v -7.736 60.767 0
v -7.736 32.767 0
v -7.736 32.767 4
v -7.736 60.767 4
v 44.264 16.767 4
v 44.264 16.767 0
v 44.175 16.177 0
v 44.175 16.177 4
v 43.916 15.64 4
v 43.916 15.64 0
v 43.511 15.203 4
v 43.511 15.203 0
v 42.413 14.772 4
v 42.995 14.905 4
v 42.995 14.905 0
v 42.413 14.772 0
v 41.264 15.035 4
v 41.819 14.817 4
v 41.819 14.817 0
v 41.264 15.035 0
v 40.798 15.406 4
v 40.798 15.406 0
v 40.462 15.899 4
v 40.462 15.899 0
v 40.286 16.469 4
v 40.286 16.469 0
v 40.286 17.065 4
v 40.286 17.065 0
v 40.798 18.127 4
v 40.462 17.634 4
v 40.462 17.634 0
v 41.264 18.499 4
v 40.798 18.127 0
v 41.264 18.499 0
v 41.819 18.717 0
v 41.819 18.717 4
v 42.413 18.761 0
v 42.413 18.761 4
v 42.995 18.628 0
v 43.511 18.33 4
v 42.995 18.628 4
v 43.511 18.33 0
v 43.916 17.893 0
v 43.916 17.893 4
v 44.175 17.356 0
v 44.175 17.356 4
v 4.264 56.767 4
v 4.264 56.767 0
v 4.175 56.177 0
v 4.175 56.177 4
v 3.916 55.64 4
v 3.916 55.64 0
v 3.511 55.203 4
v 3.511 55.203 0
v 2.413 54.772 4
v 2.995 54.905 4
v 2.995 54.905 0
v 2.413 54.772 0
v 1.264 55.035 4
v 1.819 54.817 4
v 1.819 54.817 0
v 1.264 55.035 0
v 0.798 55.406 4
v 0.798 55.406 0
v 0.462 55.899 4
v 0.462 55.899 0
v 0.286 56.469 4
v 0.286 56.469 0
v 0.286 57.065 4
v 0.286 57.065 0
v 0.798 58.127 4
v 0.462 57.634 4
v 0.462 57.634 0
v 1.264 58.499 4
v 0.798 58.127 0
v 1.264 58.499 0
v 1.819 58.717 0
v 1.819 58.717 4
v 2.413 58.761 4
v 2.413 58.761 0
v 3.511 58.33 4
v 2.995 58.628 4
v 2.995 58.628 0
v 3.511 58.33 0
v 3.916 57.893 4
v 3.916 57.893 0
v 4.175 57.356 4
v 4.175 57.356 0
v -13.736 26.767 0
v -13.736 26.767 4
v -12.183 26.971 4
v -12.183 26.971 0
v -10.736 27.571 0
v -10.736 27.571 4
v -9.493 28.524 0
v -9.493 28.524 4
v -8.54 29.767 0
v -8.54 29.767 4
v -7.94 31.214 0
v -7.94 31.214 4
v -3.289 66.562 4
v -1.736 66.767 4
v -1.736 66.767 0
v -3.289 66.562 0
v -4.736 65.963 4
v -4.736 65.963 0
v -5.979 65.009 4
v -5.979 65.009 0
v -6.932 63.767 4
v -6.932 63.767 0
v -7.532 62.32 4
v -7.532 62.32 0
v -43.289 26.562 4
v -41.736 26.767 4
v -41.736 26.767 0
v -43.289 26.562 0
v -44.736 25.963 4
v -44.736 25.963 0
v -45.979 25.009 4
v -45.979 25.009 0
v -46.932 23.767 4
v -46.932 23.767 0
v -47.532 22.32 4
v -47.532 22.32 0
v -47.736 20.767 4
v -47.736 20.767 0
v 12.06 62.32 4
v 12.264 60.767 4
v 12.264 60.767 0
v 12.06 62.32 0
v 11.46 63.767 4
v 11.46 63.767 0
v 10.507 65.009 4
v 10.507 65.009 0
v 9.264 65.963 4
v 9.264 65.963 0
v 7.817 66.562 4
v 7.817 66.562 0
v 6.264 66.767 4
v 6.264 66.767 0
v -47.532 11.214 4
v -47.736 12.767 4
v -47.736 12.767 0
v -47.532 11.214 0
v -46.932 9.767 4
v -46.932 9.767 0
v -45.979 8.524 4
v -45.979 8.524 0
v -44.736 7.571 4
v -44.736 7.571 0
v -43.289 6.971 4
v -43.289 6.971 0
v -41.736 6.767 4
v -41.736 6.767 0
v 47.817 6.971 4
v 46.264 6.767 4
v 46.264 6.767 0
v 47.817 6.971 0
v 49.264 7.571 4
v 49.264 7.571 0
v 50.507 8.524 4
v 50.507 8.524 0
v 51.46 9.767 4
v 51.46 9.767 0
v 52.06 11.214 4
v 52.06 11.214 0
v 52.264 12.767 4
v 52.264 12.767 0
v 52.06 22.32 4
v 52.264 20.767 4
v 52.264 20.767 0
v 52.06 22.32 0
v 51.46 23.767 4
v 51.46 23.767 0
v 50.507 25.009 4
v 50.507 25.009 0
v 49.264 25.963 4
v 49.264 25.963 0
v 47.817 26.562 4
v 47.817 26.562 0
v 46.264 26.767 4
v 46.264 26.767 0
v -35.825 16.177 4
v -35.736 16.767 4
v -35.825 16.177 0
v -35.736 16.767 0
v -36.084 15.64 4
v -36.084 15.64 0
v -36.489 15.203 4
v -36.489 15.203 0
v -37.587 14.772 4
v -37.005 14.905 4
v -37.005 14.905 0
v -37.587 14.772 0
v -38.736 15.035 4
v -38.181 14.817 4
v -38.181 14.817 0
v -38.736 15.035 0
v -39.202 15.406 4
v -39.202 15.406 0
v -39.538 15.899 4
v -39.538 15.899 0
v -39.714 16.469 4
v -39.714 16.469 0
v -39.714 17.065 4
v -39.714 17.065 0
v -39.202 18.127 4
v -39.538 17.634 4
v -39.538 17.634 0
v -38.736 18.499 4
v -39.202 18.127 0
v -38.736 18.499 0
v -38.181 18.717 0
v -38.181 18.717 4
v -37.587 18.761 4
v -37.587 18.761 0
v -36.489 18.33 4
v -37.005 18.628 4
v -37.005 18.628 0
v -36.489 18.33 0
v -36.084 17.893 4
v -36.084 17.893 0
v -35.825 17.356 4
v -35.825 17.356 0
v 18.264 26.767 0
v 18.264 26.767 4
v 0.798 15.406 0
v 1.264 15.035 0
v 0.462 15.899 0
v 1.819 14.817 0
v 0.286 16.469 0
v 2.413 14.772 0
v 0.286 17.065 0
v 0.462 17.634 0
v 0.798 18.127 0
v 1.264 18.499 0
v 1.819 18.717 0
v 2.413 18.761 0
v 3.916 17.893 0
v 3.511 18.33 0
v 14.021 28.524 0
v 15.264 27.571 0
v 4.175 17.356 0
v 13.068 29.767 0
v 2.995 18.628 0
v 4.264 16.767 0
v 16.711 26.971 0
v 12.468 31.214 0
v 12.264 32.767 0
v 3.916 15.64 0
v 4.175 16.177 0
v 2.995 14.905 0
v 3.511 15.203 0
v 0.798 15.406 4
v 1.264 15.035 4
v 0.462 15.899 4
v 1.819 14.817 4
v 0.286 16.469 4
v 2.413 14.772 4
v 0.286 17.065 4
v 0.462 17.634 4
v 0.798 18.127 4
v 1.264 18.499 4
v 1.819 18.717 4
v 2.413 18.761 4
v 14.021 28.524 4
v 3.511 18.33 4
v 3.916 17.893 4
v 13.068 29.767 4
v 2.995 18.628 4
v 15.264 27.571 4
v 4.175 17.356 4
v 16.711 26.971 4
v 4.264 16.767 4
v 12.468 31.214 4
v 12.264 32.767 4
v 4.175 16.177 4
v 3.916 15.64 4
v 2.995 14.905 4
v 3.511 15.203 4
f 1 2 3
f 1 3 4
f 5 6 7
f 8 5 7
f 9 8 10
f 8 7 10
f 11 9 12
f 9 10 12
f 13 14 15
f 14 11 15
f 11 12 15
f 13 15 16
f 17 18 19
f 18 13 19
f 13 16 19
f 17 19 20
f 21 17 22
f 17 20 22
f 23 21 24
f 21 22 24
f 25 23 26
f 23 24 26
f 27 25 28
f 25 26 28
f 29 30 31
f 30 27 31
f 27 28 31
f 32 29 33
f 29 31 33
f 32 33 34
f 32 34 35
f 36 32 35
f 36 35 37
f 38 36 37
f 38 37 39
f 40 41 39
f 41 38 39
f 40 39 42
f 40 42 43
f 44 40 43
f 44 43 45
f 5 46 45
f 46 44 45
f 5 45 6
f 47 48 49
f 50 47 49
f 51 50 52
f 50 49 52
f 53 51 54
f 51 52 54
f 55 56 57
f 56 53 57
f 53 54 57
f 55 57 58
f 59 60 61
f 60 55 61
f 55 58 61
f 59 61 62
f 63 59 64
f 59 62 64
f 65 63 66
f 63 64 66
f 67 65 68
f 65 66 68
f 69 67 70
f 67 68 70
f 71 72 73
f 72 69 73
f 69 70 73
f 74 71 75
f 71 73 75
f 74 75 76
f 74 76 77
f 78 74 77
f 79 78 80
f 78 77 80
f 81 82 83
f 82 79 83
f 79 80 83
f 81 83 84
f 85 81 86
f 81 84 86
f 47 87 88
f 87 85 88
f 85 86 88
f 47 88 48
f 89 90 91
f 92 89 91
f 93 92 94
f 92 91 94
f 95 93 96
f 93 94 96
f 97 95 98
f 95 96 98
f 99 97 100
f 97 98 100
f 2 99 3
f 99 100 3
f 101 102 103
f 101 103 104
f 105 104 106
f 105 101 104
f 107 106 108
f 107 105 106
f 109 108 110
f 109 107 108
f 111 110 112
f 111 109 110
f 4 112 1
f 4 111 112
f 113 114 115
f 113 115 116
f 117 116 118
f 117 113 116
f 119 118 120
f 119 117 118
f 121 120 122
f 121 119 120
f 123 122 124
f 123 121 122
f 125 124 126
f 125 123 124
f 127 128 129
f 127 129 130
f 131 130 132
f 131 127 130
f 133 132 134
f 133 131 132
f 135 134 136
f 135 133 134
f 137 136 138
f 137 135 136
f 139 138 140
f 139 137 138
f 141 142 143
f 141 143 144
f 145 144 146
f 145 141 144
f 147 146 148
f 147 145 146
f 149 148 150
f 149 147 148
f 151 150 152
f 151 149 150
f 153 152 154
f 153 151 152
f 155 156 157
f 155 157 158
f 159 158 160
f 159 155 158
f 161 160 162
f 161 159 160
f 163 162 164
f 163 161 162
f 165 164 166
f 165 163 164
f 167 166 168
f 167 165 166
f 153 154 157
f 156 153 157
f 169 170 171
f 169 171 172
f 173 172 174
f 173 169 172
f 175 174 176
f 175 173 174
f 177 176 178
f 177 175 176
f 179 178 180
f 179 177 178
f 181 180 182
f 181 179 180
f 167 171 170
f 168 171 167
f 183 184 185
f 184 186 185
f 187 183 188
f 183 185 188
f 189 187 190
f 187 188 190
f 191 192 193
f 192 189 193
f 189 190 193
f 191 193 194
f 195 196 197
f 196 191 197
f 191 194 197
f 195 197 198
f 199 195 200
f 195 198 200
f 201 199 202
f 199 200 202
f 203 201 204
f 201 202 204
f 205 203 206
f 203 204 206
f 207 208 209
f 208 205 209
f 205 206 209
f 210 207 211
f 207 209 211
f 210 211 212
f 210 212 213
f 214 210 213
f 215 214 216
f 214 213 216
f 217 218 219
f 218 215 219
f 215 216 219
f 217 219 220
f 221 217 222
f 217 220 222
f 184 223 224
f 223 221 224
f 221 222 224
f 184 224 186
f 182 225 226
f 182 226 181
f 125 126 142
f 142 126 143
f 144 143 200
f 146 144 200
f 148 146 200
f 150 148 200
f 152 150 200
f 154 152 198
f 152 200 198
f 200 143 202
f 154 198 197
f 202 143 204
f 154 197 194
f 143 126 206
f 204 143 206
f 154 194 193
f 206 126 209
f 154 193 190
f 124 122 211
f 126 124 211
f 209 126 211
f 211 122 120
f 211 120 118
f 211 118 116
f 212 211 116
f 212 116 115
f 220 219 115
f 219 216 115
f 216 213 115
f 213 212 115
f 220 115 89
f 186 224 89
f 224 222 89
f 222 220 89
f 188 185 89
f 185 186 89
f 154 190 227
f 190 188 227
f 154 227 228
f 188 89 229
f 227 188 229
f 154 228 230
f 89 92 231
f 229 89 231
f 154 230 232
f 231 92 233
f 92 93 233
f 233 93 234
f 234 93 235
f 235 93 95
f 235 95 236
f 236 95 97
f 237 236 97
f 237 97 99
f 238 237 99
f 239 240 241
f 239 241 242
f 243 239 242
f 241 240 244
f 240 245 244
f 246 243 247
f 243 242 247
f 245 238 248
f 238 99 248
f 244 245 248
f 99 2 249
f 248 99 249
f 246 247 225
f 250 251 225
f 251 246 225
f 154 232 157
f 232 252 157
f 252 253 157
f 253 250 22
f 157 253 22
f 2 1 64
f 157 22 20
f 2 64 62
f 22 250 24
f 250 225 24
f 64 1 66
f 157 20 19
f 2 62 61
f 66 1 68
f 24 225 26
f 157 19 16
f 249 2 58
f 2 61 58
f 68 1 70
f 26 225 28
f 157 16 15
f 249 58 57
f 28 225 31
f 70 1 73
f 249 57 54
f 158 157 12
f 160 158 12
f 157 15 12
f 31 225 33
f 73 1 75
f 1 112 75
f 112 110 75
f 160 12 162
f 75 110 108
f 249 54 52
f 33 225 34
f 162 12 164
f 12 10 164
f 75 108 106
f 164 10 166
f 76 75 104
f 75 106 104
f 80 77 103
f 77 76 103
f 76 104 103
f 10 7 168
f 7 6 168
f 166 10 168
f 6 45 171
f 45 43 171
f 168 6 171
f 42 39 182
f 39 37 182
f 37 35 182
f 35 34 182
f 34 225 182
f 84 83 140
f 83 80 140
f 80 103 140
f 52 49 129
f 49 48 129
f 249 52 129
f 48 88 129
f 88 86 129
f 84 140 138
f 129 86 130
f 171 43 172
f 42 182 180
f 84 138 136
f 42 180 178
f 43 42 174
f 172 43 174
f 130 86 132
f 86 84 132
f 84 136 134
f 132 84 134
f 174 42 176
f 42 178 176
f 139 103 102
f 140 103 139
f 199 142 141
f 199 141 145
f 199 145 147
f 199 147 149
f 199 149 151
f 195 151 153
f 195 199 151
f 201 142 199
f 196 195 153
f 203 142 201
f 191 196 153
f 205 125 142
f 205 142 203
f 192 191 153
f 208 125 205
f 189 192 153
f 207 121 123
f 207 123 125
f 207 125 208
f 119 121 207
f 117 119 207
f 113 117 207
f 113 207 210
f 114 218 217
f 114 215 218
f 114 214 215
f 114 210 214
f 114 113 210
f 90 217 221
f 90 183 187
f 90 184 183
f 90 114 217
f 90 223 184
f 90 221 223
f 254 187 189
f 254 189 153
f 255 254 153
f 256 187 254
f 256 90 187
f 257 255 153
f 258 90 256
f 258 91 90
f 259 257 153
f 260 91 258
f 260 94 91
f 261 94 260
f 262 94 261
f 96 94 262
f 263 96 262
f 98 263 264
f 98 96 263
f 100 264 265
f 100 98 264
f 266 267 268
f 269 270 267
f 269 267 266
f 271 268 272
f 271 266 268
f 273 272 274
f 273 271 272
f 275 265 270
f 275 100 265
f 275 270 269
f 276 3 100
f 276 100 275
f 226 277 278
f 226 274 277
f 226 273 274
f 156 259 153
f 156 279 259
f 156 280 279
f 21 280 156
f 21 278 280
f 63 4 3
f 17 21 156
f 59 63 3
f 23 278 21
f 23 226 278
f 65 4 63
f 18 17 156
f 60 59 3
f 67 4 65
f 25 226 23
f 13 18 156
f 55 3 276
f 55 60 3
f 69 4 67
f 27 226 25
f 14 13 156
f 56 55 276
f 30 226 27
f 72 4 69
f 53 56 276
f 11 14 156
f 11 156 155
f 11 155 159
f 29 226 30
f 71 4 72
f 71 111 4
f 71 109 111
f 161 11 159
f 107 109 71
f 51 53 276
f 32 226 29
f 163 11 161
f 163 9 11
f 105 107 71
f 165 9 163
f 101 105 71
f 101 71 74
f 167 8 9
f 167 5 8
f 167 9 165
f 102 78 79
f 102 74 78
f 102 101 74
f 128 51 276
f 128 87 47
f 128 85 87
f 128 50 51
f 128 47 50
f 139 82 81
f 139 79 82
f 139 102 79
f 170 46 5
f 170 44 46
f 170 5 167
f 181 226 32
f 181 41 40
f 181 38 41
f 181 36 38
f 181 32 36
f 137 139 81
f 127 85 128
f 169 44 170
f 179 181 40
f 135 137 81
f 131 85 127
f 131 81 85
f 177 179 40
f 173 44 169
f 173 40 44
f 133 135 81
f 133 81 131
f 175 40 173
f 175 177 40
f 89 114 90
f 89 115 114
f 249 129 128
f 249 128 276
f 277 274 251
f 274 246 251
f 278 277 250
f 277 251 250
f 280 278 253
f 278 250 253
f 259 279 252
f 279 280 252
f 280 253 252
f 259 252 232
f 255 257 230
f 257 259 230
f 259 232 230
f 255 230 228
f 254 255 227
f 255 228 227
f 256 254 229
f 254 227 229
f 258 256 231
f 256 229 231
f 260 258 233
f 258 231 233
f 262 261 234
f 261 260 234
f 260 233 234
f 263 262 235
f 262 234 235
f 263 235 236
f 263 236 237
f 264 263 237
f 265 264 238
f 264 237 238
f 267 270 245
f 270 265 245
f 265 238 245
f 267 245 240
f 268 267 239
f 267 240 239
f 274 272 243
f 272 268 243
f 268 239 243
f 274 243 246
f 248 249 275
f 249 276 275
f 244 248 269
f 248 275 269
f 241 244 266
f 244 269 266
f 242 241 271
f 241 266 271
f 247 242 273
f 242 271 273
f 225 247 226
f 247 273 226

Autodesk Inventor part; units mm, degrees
ref_plane "YZ Plane" through (0, 0, 0) normal (1, 0, 0) x (0, 1, 0)
ref_plane "XZ Plane" through (0, 0, 0) normal (0, 1, 0) x (-1, 0, 0)
ref_plane "XY Plane" through (0, 0, 0) normal (0, 0, 1) x (1, 0, 0)
sketch "Szkic1" plane through (0, 0, 0) normal (0, 0, 1) x (1, 0, 0)
  line L0 (-47.736, 26.7667) -> (-47.736, 6.7667)
  line L1 (-47.736, 26.7667) -> (52.264, 26.7667)
  line L2 (52.264, 26.7667) -> (52.264, 6.7667)
  circle A0 centre (-37.736, 16.7667) radius 2
  circle A1 centre (2.264, 16.7667) radius 2
  circle A2 centre (42.264, 16.7667) radius 2
  line L3 (-7.736, 26.7667) -> (-7.736, 66.7667)
  line L4 (-7.736, 66.7667) -> (12.264, 66.7667)
  line L5 (12.264, 66.7667) -> (12.264, 26.7667)
  circle A3 centre (2.264, 56.7667) radius 2
  line L6 (-47.736, 6.7667) -> (52.264, 6.7667)
  point P0 (0, 0)
  dimension "d0" = 20
  dimension "d1" = 100
  dimension "d4" = 4
  dimension "d5" = 4
  dimension "d6" = 4
  dimension "d7" = 10
  dimension "d8" = 10
  dimension "d9" = 10
  dimension "d10" = 10
  dimension "d11" = 10
  dimension "d12" = 50
  dimension "d13" = 40
  dimension "d14" = 20
  dimension "d15" = 40
  dimension "d16" = 10
  dimension "d17" = 10
  dimension "d18" = 4
extrude "Wyciągnięcie proste1" add sketch "Szkic1" along normal blind 4
fillet "Zaokrąglenie1" radius 6 8 edges at (12.264, 26.7667, 2) (12.264, 66.7667, 2) (-7.736, 66.7667, 2) (-7.736, 26.7667, 2) (-47.736, 26.7667, 2) (52.264, 26.7667, 2) (-47.736, 6.7667, 2) (52.264, 6.7667, 2)
equation "\"d12\" = 0.5 * d1"
properties part number "LC_ALU_4mm_Heatbed_Frame_T_Bracket"
